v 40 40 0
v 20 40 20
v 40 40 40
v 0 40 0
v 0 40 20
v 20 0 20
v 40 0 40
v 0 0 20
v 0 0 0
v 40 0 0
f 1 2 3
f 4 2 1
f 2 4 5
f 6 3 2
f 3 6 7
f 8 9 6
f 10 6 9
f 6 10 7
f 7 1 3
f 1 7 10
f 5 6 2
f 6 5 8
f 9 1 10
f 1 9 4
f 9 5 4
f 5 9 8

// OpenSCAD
cube([40,40,20]);
intersection(){
translate([20,0,20])
rotate([0,45,0])
cube([20,40,40]);
translate([20,0,0])
cube([20,40,40]);
}
